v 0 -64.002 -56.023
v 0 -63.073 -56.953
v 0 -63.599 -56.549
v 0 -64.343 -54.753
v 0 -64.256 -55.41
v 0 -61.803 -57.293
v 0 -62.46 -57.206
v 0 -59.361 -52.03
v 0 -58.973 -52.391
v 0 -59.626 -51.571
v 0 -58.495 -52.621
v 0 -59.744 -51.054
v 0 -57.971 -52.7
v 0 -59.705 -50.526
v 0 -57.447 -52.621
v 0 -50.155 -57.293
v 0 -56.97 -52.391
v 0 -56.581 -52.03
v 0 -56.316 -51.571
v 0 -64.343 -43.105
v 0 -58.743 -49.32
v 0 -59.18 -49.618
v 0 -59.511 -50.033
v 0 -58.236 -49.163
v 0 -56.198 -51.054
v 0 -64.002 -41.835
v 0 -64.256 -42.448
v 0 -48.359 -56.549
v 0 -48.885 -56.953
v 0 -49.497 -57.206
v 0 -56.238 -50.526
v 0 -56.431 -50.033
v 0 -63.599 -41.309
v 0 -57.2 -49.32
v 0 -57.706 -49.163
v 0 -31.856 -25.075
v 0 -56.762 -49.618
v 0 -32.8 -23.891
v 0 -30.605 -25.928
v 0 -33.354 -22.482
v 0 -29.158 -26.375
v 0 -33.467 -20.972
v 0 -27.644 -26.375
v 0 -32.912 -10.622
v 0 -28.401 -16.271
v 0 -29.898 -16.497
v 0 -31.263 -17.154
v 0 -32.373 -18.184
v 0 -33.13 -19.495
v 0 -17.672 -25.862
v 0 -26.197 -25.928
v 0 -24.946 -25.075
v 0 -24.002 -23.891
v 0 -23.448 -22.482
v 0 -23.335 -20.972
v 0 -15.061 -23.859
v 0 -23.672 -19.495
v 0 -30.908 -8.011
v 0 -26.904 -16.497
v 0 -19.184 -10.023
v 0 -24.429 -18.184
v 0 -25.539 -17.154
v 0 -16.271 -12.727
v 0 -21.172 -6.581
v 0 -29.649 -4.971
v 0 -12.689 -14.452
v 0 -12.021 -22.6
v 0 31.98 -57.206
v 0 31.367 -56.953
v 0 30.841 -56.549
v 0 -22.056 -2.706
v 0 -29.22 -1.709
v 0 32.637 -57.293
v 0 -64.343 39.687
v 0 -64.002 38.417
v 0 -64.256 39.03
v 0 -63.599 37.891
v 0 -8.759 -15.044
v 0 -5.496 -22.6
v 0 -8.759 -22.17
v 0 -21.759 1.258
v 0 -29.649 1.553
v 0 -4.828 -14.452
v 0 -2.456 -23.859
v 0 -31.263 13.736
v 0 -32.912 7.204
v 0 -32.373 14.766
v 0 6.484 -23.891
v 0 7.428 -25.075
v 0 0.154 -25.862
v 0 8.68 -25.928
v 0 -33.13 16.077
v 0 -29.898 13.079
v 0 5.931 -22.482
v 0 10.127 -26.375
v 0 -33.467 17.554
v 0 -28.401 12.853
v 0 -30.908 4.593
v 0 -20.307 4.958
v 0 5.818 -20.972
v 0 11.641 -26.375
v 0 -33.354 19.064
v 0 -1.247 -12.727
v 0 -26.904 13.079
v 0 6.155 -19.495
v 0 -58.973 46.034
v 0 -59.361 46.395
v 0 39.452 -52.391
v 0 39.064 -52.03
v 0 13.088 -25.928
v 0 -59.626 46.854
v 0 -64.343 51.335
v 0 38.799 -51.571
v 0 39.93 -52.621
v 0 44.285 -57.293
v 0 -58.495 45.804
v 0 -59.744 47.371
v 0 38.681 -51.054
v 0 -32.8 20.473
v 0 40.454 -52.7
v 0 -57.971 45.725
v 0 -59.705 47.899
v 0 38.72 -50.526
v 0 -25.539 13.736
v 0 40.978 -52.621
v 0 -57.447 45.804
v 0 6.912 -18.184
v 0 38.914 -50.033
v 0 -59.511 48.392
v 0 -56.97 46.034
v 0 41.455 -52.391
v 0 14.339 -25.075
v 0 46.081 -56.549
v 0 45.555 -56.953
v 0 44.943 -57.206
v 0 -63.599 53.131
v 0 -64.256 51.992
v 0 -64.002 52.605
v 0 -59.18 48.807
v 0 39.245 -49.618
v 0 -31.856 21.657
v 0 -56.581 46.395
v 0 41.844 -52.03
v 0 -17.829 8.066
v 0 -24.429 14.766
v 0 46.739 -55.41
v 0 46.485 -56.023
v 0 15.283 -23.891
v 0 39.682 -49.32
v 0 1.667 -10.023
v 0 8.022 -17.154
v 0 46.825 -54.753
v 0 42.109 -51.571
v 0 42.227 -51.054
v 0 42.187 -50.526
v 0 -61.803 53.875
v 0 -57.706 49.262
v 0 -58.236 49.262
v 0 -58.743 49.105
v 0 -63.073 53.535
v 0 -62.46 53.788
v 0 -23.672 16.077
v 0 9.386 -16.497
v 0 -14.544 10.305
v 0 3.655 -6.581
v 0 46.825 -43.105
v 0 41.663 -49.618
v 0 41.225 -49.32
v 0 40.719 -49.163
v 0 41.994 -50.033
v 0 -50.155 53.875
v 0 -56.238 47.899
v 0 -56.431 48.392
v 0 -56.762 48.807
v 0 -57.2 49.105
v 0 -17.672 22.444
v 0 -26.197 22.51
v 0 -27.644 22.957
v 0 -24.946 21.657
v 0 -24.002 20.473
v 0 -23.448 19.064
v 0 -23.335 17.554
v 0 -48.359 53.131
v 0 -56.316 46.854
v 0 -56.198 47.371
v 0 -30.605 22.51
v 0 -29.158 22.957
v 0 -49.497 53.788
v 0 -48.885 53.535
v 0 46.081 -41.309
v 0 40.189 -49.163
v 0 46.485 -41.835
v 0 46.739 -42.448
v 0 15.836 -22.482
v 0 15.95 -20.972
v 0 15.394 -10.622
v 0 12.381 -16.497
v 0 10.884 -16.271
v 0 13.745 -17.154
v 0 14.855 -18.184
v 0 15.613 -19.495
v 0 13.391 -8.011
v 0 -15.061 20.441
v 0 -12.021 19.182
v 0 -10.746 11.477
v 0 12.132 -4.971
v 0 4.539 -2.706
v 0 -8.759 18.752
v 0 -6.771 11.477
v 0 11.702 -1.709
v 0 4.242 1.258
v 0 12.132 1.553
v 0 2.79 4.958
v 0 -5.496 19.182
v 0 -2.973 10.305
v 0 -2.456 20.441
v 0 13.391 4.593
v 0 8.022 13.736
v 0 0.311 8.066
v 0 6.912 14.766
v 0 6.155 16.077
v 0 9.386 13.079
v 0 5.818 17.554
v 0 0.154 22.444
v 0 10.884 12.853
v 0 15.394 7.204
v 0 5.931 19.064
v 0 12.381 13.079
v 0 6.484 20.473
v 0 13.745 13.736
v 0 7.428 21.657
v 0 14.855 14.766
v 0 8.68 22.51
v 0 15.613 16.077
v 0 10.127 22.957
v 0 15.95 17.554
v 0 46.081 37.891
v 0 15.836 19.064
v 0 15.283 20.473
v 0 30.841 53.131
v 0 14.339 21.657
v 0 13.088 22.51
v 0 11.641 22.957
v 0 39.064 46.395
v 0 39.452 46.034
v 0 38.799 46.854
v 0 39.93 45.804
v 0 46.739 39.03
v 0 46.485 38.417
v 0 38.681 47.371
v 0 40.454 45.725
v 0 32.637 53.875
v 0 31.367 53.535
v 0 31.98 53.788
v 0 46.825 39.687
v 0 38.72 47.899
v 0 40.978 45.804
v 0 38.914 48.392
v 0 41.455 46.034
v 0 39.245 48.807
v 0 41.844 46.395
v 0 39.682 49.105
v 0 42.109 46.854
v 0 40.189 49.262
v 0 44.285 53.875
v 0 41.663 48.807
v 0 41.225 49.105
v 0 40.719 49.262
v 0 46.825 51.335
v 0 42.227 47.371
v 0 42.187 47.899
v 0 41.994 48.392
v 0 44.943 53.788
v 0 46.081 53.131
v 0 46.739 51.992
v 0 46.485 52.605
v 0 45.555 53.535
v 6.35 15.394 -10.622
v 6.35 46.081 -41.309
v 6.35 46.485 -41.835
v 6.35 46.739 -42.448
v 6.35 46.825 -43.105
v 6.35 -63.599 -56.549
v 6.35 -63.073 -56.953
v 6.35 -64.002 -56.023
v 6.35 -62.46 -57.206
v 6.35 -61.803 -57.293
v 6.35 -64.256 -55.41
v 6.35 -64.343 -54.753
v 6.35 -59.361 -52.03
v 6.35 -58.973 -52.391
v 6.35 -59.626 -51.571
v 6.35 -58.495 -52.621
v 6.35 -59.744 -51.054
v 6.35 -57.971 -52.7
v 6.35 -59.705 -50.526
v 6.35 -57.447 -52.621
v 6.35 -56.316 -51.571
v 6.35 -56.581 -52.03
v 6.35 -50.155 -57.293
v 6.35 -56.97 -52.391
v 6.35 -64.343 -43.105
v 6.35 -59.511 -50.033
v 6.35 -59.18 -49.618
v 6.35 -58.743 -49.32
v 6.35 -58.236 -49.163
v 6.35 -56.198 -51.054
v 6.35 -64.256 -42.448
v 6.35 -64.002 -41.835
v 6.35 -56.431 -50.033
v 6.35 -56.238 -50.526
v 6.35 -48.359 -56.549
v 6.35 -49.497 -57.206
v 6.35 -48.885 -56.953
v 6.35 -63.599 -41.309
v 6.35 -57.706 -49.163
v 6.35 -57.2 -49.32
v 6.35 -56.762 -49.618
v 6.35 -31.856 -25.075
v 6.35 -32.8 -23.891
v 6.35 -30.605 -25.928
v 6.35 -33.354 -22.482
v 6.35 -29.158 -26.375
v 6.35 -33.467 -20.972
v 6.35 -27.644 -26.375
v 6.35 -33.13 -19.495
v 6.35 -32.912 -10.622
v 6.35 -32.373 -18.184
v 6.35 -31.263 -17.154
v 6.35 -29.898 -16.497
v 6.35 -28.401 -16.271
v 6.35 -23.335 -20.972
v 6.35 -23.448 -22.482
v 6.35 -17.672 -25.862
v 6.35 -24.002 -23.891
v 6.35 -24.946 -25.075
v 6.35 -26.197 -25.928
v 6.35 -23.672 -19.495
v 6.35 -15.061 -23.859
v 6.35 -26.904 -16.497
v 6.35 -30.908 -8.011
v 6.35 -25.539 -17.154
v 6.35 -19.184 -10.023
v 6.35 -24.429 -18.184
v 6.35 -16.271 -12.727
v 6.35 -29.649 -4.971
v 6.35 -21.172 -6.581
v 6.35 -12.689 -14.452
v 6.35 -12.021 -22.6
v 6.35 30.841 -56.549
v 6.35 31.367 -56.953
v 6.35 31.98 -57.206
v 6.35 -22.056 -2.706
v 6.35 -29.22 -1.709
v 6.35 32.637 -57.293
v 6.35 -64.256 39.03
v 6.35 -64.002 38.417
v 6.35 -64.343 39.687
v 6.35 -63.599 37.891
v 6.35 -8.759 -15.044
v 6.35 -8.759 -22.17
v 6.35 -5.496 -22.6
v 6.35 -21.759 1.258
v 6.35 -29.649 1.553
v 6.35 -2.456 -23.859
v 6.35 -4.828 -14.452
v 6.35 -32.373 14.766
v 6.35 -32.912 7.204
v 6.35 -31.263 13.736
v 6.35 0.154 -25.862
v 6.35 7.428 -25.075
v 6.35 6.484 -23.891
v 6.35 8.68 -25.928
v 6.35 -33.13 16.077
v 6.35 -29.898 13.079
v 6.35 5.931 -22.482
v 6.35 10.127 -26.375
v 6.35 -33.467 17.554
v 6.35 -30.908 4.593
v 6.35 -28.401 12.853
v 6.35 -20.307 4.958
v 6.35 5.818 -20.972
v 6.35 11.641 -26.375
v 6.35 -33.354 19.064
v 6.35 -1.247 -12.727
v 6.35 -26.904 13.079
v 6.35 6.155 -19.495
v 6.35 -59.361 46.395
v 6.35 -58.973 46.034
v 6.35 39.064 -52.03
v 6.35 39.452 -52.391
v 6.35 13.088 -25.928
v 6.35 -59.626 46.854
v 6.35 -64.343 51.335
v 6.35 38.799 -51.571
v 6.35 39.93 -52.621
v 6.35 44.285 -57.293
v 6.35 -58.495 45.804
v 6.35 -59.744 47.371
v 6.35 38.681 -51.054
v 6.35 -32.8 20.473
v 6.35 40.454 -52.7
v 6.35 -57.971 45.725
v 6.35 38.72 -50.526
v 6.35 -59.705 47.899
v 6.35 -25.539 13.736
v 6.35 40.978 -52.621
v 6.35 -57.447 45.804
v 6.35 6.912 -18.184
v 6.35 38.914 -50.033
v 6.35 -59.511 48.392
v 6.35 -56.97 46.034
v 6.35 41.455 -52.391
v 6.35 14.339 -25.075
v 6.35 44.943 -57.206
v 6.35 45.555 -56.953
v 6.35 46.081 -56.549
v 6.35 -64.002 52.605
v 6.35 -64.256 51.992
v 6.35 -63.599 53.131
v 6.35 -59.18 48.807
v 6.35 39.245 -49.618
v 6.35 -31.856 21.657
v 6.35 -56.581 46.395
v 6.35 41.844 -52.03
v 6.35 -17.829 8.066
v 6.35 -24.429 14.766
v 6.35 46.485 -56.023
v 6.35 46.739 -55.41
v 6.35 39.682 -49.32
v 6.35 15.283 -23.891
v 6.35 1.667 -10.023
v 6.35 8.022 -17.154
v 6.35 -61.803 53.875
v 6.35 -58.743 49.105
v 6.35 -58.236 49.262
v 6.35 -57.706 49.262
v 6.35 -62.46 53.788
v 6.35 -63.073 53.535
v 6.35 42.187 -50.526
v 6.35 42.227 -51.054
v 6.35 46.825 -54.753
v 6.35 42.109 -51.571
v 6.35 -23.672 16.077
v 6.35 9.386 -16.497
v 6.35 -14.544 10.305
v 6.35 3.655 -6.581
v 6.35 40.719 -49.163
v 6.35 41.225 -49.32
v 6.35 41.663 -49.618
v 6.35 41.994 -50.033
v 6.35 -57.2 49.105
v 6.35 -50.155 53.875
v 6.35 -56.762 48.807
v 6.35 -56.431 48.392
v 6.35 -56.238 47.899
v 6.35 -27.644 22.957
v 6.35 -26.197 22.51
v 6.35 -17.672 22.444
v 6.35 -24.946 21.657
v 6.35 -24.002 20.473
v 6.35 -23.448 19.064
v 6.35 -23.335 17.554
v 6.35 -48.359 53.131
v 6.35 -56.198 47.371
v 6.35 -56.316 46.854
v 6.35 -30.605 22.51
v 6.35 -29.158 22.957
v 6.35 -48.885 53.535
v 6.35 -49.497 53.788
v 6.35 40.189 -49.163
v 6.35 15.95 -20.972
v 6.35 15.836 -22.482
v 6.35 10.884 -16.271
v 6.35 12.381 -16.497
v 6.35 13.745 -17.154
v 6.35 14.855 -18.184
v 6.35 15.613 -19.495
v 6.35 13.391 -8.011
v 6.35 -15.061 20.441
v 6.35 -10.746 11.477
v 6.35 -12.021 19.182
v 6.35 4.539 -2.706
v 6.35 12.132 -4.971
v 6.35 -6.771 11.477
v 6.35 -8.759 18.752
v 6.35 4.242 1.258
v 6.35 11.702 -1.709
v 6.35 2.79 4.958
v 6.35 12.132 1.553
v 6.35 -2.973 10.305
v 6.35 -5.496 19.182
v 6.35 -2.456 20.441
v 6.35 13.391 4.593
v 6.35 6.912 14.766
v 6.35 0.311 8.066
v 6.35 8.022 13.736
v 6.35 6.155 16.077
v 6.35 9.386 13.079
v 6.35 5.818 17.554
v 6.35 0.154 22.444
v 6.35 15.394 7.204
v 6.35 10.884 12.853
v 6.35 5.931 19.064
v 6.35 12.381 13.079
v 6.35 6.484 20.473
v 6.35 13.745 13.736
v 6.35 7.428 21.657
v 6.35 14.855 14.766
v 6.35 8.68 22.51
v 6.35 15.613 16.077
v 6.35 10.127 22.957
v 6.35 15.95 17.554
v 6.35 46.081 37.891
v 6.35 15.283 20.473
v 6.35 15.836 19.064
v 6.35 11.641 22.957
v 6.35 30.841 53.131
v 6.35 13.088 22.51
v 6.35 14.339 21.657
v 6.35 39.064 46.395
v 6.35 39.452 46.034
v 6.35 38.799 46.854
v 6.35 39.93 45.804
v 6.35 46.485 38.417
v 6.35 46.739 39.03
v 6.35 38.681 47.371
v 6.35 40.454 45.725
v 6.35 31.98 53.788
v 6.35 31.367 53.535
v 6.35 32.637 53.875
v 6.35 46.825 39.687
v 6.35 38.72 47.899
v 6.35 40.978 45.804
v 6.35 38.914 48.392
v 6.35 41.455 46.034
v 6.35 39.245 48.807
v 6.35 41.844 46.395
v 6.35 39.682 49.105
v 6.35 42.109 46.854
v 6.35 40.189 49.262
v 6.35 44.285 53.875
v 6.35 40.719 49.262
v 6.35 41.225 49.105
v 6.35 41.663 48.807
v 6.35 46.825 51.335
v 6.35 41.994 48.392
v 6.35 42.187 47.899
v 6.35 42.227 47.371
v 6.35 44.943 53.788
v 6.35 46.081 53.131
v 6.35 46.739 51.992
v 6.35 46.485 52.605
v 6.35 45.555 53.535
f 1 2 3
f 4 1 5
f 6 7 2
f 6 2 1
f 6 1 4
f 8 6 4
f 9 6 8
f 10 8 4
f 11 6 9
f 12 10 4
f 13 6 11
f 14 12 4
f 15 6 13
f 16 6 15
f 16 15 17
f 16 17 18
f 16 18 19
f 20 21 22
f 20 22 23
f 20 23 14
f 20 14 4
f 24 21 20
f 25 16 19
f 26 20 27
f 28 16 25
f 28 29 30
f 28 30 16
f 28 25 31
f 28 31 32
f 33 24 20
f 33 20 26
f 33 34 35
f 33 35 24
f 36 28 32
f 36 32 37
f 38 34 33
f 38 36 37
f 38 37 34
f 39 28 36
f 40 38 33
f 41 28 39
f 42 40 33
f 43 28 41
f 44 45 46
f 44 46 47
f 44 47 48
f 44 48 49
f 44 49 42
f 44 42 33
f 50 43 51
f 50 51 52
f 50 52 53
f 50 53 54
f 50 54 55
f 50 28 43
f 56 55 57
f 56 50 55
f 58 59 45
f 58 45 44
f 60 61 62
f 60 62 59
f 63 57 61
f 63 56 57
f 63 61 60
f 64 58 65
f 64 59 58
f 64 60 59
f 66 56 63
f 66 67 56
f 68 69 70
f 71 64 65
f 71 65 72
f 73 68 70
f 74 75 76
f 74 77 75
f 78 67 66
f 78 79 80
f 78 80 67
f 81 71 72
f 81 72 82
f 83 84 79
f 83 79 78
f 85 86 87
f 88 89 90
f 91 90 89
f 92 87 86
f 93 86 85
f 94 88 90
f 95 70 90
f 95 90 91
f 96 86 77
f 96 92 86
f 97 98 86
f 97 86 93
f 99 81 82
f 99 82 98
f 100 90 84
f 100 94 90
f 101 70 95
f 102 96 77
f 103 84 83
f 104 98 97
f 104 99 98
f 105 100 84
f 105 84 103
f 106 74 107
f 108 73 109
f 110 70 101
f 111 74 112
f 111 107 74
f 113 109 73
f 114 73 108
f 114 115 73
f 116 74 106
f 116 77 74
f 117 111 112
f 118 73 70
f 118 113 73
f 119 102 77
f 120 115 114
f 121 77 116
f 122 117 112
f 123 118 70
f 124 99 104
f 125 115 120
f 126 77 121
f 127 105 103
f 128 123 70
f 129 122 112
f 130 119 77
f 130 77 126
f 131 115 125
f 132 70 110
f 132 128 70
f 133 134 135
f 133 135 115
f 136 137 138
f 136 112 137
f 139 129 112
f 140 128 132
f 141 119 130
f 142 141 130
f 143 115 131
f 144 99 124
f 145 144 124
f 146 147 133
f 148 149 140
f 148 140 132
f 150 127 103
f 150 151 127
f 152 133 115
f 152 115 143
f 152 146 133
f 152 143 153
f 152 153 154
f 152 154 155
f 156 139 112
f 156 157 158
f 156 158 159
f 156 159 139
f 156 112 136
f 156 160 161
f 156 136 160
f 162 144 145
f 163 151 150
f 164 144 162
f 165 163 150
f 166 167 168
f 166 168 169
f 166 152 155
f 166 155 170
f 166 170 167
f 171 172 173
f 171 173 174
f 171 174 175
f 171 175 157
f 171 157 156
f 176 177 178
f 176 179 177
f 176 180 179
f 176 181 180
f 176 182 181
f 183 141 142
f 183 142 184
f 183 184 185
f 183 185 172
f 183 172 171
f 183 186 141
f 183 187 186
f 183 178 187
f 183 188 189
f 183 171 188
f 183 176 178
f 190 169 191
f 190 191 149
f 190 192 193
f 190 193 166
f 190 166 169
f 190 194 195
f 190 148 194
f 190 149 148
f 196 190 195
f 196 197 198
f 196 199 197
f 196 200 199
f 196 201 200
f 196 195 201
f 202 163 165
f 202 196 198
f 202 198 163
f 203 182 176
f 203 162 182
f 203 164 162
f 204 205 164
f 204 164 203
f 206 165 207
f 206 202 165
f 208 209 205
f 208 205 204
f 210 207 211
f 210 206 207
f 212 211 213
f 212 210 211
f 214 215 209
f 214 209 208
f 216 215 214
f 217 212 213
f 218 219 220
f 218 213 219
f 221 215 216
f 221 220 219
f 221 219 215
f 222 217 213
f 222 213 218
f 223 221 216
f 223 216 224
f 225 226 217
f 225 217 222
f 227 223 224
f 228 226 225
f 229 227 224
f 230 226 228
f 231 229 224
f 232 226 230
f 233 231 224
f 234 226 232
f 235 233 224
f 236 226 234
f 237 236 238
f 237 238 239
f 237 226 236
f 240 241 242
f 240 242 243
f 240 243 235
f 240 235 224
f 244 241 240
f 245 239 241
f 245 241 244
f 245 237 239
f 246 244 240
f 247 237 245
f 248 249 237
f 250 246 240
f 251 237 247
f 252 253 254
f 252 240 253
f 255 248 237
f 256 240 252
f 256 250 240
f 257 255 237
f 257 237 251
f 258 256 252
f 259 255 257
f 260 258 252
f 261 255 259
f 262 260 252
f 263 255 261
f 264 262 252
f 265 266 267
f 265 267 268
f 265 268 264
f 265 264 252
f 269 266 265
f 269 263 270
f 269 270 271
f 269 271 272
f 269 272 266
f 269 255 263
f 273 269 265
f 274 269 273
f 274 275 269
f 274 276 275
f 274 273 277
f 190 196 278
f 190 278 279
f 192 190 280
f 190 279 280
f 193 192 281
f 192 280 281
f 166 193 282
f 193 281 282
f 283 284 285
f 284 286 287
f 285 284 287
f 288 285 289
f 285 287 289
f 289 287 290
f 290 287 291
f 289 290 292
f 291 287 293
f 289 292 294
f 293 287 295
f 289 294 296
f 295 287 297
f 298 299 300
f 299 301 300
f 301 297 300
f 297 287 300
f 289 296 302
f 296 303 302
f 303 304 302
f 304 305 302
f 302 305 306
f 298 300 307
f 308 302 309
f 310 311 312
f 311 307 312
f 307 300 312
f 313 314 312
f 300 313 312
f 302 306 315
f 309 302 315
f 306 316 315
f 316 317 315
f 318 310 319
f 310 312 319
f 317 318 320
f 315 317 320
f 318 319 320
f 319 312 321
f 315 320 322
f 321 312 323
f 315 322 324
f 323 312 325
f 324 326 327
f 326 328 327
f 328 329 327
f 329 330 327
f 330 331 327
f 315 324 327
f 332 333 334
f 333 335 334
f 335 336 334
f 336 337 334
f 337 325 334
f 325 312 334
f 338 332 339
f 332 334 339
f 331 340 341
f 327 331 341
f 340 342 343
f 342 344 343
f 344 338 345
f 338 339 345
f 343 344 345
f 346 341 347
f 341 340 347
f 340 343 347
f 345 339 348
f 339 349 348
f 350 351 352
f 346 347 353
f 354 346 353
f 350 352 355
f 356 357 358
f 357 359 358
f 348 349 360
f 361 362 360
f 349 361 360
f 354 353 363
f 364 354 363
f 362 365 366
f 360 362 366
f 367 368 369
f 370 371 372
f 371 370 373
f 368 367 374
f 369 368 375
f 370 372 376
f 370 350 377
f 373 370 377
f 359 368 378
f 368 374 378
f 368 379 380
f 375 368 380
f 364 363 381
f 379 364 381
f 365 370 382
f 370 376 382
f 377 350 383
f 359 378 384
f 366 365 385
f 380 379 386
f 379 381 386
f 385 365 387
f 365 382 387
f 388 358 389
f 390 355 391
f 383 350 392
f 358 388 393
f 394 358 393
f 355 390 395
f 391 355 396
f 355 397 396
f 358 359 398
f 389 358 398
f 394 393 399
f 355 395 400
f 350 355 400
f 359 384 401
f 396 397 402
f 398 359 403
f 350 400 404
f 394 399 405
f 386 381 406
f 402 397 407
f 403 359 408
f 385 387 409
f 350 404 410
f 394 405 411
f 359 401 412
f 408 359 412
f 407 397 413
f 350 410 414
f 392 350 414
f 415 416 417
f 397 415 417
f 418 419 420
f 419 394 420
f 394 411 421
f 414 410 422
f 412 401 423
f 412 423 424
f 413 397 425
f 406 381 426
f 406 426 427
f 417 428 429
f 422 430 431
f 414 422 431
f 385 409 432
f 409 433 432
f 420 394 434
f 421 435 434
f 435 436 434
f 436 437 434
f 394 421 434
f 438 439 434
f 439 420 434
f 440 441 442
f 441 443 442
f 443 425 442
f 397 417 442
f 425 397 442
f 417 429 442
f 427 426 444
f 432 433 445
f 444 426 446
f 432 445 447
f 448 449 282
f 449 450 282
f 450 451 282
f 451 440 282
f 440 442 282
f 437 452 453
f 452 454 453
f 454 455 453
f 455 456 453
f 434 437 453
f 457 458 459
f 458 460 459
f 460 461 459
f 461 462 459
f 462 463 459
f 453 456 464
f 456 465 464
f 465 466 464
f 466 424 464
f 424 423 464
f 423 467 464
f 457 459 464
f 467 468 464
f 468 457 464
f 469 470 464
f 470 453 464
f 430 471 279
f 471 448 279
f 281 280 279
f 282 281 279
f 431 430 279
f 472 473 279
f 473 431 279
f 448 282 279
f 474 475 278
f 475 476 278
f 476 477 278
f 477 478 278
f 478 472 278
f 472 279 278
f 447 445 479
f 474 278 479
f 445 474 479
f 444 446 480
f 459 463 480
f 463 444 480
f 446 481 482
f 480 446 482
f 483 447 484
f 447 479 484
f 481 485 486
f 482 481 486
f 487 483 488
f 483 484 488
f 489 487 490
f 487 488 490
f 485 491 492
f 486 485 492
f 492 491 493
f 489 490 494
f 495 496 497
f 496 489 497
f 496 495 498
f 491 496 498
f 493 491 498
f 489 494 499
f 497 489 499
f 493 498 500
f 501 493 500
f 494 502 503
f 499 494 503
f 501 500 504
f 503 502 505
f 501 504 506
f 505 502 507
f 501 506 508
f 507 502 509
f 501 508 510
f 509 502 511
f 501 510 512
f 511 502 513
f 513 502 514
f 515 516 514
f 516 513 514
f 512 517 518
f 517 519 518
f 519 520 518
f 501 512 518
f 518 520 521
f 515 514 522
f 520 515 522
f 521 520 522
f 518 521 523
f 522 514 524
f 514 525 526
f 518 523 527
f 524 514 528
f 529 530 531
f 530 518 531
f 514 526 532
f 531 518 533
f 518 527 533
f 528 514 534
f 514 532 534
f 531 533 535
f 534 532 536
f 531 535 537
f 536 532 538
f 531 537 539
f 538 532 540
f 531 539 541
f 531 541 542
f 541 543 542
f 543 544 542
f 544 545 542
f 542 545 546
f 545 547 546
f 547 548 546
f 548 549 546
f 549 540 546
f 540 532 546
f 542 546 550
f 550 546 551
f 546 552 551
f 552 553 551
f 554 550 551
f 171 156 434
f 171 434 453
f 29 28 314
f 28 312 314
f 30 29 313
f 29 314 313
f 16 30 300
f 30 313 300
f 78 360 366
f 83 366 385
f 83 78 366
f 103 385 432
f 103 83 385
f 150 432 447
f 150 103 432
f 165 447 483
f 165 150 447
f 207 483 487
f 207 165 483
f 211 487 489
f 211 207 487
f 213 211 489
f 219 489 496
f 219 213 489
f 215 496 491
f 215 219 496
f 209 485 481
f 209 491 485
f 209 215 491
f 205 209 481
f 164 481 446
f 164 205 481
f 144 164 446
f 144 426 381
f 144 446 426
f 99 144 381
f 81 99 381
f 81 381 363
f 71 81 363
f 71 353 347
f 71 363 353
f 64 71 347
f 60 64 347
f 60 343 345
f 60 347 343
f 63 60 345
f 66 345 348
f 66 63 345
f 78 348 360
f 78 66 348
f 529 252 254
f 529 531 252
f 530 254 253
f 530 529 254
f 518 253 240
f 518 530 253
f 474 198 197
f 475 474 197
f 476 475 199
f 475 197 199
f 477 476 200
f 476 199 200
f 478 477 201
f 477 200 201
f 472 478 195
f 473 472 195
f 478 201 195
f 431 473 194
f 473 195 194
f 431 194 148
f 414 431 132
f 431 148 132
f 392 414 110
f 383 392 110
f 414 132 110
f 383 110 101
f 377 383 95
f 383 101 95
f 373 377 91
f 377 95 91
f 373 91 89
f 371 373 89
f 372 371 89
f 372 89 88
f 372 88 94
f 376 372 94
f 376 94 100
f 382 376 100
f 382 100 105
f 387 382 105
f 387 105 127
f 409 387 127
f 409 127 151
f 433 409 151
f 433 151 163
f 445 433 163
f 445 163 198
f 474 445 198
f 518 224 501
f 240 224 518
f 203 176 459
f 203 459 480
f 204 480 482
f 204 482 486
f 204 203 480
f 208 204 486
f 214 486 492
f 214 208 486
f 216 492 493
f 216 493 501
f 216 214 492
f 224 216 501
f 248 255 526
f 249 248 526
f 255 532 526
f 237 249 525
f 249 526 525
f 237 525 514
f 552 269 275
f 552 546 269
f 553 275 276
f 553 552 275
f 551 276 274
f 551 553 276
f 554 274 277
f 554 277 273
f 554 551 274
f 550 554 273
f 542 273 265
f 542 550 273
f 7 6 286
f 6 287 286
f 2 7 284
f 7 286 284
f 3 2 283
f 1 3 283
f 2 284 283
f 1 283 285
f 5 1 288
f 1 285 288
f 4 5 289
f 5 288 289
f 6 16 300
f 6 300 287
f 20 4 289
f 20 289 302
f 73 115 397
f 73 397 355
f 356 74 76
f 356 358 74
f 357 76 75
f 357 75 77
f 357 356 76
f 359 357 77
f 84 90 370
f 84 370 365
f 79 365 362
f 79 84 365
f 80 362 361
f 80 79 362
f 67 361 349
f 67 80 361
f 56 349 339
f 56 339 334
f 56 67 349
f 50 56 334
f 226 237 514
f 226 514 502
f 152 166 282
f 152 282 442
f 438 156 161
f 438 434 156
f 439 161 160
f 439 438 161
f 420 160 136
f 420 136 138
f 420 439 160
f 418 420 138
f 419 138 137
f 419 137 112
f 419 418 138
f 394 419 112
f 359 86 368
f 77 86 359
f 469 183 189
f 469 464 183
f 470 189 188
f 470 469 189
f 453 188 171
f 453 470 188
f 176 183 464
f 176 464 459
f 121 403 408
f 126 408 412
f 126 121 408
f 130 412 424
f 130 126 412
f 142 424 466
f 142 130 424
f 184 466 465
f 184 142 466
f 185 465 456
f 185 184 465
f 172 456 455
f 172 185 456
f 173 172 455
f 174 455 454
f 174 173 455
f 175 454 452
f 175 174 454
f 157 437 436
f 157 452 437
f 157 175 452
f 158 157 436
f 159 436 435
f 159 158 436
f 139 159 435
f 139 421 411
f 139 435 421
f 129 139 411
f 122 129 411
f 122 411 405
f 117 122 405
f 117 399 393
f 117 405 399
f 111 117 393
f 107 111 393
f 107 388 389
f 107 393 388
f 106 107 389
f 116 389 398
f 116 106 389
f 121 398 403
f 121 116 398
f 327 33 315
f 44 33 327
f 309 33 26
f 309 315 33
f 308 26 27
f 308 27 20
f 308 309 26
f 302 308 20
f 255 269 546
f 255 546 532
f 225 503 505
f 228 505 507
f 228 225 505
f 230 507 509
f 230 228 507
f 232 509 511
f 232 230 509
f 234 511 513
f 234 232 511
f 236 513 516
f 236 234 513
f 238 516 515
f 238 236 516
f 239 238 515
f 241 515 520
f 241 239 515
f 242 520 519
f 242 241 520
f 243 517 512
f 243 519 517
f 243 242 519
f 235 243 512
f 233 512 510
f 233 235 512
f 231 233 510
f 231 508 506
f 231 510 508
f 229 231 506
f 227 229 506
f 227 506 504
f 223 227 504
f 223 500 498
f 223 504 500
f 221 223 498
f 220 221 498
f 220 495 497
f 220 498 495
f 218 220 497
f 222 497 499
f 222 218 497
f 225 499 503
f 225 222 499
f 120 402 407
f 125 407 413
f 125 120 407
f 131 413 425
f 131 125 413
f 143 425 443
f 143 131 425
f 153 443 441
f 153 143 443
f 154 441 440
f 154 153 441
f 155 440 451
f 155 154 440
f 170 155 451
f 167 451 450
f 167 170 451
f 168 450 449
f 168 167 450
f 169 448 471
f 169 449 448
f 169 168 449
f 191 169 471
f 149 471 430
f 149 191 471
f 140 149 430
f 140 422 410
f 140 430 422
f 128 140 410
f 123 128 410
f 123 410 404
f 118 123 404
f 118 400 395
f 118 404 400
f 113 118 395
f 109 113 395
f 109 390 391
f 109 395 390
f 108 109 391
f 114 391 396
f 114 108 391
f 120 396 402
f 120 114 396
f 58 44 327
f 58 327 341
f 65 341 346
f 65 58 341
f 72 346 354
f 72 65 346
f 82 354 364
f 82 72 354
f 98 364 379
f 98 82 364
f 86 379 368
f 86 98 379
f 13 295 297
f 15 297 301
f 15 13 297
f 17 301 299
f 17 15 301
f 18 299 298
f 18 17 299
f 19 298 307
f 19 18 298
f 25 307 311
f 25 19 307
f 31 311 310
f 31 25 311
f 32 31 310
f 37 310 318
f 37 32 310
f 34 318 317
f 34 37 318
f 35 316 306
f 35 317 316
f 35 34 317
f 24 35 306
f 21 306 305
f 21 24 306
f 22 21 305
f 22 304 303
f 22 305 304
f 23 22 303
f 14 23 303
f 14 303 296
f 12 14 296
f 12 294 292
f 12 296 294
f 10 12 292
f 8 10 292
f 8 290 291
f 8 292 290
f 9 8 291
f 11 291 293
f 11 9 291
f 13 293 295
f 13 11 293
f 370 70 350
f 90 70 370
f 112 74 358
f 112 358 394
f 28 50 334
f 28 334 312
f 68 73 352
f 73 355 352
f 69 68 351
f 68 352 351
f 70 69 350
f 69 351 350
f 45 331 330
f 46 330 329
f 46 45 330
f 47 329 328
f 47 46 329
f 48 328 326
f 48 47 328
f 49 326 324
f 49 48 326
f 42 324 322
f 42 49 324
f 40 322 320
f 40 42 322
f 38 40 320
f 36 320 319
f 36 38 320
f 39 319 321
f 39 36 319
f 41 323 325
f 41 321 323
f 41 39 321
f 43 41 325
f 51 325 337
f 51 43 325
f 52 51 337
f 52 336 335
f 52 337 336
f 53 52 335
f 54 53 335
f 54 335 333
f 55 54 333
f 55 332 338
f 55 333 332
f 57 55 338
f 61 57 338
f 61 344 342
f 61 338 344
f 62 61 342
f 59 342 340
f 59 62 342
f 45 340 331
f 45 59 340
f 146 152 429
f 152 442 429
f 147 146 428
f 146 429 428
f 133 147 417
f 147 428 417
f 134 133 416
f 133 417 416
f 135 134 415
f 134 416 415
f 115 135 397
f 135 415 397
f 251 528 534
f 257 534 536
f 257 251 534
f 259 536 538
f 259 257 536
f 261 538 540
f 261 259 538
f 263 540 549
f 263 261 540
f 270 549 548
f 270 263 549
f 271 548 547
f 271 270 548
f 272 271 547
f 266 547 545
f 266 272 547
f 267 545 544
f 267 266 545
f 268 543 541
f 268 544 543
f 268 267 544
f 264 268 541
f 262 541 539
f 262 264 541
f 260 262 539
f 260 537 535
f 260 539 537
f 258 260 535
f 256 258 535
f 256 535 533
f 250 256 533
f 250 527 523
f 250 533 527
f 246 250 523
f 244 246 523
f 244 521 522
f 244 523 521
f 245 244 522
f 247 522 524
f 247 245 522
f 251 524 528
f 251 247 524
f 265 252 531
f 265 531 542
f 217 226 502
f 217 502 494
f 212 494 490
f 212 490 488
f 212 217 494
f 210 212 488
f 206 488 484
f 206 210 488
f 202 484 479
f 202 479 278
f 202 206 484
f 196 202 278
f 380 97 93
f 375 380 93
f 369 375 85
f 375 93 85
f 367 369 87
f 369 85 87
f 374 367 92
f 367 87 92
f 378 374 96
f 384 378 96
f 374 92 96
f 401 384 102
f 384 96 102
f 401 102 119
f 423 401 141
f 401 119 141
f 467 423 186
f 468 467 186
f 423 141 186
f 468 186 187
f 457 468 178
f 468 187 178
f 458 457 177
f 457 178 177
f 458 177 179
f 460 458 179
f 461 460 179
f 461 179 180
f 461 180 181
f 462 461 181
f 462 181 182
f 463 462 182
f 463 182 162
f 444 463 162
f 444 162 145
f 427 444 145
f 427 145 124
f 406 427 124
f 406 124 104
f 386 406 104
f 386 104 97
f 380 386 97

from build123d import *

# Parameters (mm, degrees)
BOSS_EXTRUDE1_DEPTH     = 6.35
SKETCH1_9_R             = 13.335
CUT_EXTRUDE1_DEPTH      = 11.938
SKETCH1_10_R            = 1.778
CUT_EXTRUDE2_DEPTH      = 24.638
SKETCH1_11_R            = 1.778
CUT_EXTRUDE3_DEPTH      = 24.13
SKETCH1_12_R            = 1.778
CUT_EXTRUDE4_DEPTH      = 38.862
SKETCH1_13_R            = 1.778
CUT_EXTRUDE5_DEPTH      = 13.462
FILLET1_R               = 2.54
SKETCH2_R               = 5.08
CUT_EXTRUDE6_DEPTH      = 13.462
MIRROR2_COPY_1_SKETCH_R = 5.08
MIRROR2_COPY_1_DEPTH    = 13.462


with BuildPart() as part:
    # Sketch1 → Boss-Extrude1 (new body)
    with BuildSketch(Plane(origin=(0, 0, 0), x_dir=(0, 0, -1), z_dir=(1, 0, 0))):
        with BuildLine():
            Line((-53.874845122, 46.825199553), (-38.634845122, 46.825199553))
            Line((-38.634845122, 46.825199553), (-7.203948698, 15.394303129))
            ThreePointArc((-7.203948698, 15.394303129), (1.709004986, 11.702436832), (10.621958671, 15.394303129))
            Line((10.621958671, 15.394303129), (42.052855095, 46.825199553))
            Line((42.052855095, 46.825199553), (57.292855095, 46.825199553))
            Line((57.292855095, 46.825199553), (57.292855095, 31.585199553))
            Line((57.292855095, 31.585199553), (25.861958671, 0.154303129))
            ThreePointArc((25.861958671, 0.154303129), (22.170092374, -8.758650555), (25.861958671, -17.67160424))
            Line((25.861958671, -17.67160424), (57.292855095, -49.102500664))
            Line((57.292855095, -49.102500664), (57.292855095, -64.342500664))
            Line((57.292855095, -64.342500664), (42.052855095, -64.342500664))
            Line((42.052855095, -64.342500664), (10.621958671, -32.91160424))
            ThreePointArc((10.621958671, -32.91160424), (1.709004986, -29.219737943), (-7.203948698, -32.91160424))
            Line((-7.203948698, -32.91160424), (-38.634845122, -64.342500664))
            Line((-38.634845122, -64.342500664), (-53.874845122, -64.342500664))
            Line((-53.874845122, -64.342500664), (-53.874845122, -49.102500664))
            Line((-53.874845122, -49.102500664), (-22.443948698, -17.67160424))
            ThreePointArc((-22.443948698, -17.67160424), (-18.752082401, -8.758650555), (-22.443948698, 0.154303129))
            Line((-22.443948698, 0.154303129), (-53.874845122, 31.585199553))
            Line((-53.874845122, 31.585199553), (-53.874845122, 46.825199553))
        make_face()
    extrude(amount=BOSS_EXTRUDE1_DEPTH)

    # Sketch1<9> → Cut-Extrude1 (cut)
    with BuildSketch(Plane(origin=(0, 0, 0), x_dir=(0, 0, -1), z_dir=(1, 0, 0))):
        with Locations((1.709004986, -8.758650555)):
            Circle(SKETCH1_9_R)
    extrude(amount=CUT_EXTRUDE1_DEPTH, mode=Mode.SUBTRACT)

    # Sketch1<10> → Cut-Extrude2 (cut)
    with BuildSketch(Plane(origin=(0, 0, 0), x_dir=(0, 0, -1), z_dir=(1, 0, 0))):
        with Locations((-47.503495014, -57.971150555)):
            Circle(SKETCH1_10_R)
    extrude(amount=CUT_EXTRUDE2_DEPTH, mode=Mode.SUBTRACT)

    # Sketch1<11> → Cut-Extrude3 (cut)
    with BuildSketch(Plane(origin=(0, 0, 0), x_dir=(0, 0, -1), z_dir=(1, 0, 0))):
        with Locations((50.921504986, -57.971150555)):
            Circle(SKETCH1_11_R)
    extrude(amount=CUT_EXTRUDE3_DEPTH, mode=Mode.SUBTRACT)

    # Sketch1<12> → Cut-Extrude4 (cut)
    with BuildSketch(Plane(origin=(0, 0, 0), x_dir=(0, 0, -1), z_dir=(1, 0, 0))):
        with Locations((50.921504986, 40.453849445)):
            Circle(SKETCH1_12_R)
    extrude(amount=CUT_EXTRUDE4_DEPTH, mode=Mode.SUBTRACT)

    # Sketch1<13> → Cut-Extrude5 (cut)
    with BuildSketch(Plane(origin=(0, 0, 0), x_dir=(0, 0, -1), z_dir=(1, 0, 0))):
        with Locations((-47.503495014, 40.453849445)):
            Circle(SKETCH1_13_R)
    extrude(amount=CUT_EXTRUDE5_DEPTH, mode=Mode.SUBTRACT)

    # Fillet1
    fillet1_edges = [part.edges().sort_by_distance(p)[0] for p in [
        (3.175, 46.825199553, 53.874845122),
        (3.175, 46.825199553, 38.634845122),
        (3.175, 46.825199553, -42.052855095),
        (3.175, 46.825199553, -57.292855095),
        (3.175, 31.585199553, -57.292855095),
        (3.175, -49.102500664, -57.292855095),
        (3.175, -64.342500664, -57.292855095),
        (3.175, -64.342500664, -42.052855095),
        (3.175, -64.342500664, 38.634845122),
        (3.175, -64.342500664, 53.874845122),
        (3.175, -49.102500664, 53.874845122),
        (3.175, 31.585199553, 53.874845122),
    ]]
    fillet(fillet1_edges, radius=FILLET1_R)

    # Sketch2 → Cut-Extrude6 (cut)
    with BuildSketch(Plane.ZY):
        with Locations((-21.351416825, 10.883761284)):
            Circle(SKETCH2_R)
    cut_extrude6 = extrude(amount=-CUT_EXTRUDE6_DEPTH, mode=Mode.SUBTRACT)

    # Mirror1: Cut-Extrude6 across plane
    add(cut_extrude6.mirror(Plane.ZX.offset(-8.758650555)), mode=Mode.SUBTRACT)

    # Mirror2: Cut-Extrude6 across plane
    add(cut_extrude6.mirror(Plane.XY.offset(-1.709004986)), mode=Mode.SUBTRACT)

    # Mirror2 copy 1 sketch → Mirror2 copy 1 (cut)
    with BuildSketch(Plane(origin=(0, -17.517301111, -3.418009973), x_dir=(0, 0, -1), z_dir=(-1, 0, 0))):
        with Locations((-21.351416825, 10.883761284)):
            Circle(MIRROR2_COPY_1_SKETCH_R)
    extrude(amount=-MIRROR2_COPY_1_DEPTH, mode=Mode.SUBTRACT)


solid = part.part
